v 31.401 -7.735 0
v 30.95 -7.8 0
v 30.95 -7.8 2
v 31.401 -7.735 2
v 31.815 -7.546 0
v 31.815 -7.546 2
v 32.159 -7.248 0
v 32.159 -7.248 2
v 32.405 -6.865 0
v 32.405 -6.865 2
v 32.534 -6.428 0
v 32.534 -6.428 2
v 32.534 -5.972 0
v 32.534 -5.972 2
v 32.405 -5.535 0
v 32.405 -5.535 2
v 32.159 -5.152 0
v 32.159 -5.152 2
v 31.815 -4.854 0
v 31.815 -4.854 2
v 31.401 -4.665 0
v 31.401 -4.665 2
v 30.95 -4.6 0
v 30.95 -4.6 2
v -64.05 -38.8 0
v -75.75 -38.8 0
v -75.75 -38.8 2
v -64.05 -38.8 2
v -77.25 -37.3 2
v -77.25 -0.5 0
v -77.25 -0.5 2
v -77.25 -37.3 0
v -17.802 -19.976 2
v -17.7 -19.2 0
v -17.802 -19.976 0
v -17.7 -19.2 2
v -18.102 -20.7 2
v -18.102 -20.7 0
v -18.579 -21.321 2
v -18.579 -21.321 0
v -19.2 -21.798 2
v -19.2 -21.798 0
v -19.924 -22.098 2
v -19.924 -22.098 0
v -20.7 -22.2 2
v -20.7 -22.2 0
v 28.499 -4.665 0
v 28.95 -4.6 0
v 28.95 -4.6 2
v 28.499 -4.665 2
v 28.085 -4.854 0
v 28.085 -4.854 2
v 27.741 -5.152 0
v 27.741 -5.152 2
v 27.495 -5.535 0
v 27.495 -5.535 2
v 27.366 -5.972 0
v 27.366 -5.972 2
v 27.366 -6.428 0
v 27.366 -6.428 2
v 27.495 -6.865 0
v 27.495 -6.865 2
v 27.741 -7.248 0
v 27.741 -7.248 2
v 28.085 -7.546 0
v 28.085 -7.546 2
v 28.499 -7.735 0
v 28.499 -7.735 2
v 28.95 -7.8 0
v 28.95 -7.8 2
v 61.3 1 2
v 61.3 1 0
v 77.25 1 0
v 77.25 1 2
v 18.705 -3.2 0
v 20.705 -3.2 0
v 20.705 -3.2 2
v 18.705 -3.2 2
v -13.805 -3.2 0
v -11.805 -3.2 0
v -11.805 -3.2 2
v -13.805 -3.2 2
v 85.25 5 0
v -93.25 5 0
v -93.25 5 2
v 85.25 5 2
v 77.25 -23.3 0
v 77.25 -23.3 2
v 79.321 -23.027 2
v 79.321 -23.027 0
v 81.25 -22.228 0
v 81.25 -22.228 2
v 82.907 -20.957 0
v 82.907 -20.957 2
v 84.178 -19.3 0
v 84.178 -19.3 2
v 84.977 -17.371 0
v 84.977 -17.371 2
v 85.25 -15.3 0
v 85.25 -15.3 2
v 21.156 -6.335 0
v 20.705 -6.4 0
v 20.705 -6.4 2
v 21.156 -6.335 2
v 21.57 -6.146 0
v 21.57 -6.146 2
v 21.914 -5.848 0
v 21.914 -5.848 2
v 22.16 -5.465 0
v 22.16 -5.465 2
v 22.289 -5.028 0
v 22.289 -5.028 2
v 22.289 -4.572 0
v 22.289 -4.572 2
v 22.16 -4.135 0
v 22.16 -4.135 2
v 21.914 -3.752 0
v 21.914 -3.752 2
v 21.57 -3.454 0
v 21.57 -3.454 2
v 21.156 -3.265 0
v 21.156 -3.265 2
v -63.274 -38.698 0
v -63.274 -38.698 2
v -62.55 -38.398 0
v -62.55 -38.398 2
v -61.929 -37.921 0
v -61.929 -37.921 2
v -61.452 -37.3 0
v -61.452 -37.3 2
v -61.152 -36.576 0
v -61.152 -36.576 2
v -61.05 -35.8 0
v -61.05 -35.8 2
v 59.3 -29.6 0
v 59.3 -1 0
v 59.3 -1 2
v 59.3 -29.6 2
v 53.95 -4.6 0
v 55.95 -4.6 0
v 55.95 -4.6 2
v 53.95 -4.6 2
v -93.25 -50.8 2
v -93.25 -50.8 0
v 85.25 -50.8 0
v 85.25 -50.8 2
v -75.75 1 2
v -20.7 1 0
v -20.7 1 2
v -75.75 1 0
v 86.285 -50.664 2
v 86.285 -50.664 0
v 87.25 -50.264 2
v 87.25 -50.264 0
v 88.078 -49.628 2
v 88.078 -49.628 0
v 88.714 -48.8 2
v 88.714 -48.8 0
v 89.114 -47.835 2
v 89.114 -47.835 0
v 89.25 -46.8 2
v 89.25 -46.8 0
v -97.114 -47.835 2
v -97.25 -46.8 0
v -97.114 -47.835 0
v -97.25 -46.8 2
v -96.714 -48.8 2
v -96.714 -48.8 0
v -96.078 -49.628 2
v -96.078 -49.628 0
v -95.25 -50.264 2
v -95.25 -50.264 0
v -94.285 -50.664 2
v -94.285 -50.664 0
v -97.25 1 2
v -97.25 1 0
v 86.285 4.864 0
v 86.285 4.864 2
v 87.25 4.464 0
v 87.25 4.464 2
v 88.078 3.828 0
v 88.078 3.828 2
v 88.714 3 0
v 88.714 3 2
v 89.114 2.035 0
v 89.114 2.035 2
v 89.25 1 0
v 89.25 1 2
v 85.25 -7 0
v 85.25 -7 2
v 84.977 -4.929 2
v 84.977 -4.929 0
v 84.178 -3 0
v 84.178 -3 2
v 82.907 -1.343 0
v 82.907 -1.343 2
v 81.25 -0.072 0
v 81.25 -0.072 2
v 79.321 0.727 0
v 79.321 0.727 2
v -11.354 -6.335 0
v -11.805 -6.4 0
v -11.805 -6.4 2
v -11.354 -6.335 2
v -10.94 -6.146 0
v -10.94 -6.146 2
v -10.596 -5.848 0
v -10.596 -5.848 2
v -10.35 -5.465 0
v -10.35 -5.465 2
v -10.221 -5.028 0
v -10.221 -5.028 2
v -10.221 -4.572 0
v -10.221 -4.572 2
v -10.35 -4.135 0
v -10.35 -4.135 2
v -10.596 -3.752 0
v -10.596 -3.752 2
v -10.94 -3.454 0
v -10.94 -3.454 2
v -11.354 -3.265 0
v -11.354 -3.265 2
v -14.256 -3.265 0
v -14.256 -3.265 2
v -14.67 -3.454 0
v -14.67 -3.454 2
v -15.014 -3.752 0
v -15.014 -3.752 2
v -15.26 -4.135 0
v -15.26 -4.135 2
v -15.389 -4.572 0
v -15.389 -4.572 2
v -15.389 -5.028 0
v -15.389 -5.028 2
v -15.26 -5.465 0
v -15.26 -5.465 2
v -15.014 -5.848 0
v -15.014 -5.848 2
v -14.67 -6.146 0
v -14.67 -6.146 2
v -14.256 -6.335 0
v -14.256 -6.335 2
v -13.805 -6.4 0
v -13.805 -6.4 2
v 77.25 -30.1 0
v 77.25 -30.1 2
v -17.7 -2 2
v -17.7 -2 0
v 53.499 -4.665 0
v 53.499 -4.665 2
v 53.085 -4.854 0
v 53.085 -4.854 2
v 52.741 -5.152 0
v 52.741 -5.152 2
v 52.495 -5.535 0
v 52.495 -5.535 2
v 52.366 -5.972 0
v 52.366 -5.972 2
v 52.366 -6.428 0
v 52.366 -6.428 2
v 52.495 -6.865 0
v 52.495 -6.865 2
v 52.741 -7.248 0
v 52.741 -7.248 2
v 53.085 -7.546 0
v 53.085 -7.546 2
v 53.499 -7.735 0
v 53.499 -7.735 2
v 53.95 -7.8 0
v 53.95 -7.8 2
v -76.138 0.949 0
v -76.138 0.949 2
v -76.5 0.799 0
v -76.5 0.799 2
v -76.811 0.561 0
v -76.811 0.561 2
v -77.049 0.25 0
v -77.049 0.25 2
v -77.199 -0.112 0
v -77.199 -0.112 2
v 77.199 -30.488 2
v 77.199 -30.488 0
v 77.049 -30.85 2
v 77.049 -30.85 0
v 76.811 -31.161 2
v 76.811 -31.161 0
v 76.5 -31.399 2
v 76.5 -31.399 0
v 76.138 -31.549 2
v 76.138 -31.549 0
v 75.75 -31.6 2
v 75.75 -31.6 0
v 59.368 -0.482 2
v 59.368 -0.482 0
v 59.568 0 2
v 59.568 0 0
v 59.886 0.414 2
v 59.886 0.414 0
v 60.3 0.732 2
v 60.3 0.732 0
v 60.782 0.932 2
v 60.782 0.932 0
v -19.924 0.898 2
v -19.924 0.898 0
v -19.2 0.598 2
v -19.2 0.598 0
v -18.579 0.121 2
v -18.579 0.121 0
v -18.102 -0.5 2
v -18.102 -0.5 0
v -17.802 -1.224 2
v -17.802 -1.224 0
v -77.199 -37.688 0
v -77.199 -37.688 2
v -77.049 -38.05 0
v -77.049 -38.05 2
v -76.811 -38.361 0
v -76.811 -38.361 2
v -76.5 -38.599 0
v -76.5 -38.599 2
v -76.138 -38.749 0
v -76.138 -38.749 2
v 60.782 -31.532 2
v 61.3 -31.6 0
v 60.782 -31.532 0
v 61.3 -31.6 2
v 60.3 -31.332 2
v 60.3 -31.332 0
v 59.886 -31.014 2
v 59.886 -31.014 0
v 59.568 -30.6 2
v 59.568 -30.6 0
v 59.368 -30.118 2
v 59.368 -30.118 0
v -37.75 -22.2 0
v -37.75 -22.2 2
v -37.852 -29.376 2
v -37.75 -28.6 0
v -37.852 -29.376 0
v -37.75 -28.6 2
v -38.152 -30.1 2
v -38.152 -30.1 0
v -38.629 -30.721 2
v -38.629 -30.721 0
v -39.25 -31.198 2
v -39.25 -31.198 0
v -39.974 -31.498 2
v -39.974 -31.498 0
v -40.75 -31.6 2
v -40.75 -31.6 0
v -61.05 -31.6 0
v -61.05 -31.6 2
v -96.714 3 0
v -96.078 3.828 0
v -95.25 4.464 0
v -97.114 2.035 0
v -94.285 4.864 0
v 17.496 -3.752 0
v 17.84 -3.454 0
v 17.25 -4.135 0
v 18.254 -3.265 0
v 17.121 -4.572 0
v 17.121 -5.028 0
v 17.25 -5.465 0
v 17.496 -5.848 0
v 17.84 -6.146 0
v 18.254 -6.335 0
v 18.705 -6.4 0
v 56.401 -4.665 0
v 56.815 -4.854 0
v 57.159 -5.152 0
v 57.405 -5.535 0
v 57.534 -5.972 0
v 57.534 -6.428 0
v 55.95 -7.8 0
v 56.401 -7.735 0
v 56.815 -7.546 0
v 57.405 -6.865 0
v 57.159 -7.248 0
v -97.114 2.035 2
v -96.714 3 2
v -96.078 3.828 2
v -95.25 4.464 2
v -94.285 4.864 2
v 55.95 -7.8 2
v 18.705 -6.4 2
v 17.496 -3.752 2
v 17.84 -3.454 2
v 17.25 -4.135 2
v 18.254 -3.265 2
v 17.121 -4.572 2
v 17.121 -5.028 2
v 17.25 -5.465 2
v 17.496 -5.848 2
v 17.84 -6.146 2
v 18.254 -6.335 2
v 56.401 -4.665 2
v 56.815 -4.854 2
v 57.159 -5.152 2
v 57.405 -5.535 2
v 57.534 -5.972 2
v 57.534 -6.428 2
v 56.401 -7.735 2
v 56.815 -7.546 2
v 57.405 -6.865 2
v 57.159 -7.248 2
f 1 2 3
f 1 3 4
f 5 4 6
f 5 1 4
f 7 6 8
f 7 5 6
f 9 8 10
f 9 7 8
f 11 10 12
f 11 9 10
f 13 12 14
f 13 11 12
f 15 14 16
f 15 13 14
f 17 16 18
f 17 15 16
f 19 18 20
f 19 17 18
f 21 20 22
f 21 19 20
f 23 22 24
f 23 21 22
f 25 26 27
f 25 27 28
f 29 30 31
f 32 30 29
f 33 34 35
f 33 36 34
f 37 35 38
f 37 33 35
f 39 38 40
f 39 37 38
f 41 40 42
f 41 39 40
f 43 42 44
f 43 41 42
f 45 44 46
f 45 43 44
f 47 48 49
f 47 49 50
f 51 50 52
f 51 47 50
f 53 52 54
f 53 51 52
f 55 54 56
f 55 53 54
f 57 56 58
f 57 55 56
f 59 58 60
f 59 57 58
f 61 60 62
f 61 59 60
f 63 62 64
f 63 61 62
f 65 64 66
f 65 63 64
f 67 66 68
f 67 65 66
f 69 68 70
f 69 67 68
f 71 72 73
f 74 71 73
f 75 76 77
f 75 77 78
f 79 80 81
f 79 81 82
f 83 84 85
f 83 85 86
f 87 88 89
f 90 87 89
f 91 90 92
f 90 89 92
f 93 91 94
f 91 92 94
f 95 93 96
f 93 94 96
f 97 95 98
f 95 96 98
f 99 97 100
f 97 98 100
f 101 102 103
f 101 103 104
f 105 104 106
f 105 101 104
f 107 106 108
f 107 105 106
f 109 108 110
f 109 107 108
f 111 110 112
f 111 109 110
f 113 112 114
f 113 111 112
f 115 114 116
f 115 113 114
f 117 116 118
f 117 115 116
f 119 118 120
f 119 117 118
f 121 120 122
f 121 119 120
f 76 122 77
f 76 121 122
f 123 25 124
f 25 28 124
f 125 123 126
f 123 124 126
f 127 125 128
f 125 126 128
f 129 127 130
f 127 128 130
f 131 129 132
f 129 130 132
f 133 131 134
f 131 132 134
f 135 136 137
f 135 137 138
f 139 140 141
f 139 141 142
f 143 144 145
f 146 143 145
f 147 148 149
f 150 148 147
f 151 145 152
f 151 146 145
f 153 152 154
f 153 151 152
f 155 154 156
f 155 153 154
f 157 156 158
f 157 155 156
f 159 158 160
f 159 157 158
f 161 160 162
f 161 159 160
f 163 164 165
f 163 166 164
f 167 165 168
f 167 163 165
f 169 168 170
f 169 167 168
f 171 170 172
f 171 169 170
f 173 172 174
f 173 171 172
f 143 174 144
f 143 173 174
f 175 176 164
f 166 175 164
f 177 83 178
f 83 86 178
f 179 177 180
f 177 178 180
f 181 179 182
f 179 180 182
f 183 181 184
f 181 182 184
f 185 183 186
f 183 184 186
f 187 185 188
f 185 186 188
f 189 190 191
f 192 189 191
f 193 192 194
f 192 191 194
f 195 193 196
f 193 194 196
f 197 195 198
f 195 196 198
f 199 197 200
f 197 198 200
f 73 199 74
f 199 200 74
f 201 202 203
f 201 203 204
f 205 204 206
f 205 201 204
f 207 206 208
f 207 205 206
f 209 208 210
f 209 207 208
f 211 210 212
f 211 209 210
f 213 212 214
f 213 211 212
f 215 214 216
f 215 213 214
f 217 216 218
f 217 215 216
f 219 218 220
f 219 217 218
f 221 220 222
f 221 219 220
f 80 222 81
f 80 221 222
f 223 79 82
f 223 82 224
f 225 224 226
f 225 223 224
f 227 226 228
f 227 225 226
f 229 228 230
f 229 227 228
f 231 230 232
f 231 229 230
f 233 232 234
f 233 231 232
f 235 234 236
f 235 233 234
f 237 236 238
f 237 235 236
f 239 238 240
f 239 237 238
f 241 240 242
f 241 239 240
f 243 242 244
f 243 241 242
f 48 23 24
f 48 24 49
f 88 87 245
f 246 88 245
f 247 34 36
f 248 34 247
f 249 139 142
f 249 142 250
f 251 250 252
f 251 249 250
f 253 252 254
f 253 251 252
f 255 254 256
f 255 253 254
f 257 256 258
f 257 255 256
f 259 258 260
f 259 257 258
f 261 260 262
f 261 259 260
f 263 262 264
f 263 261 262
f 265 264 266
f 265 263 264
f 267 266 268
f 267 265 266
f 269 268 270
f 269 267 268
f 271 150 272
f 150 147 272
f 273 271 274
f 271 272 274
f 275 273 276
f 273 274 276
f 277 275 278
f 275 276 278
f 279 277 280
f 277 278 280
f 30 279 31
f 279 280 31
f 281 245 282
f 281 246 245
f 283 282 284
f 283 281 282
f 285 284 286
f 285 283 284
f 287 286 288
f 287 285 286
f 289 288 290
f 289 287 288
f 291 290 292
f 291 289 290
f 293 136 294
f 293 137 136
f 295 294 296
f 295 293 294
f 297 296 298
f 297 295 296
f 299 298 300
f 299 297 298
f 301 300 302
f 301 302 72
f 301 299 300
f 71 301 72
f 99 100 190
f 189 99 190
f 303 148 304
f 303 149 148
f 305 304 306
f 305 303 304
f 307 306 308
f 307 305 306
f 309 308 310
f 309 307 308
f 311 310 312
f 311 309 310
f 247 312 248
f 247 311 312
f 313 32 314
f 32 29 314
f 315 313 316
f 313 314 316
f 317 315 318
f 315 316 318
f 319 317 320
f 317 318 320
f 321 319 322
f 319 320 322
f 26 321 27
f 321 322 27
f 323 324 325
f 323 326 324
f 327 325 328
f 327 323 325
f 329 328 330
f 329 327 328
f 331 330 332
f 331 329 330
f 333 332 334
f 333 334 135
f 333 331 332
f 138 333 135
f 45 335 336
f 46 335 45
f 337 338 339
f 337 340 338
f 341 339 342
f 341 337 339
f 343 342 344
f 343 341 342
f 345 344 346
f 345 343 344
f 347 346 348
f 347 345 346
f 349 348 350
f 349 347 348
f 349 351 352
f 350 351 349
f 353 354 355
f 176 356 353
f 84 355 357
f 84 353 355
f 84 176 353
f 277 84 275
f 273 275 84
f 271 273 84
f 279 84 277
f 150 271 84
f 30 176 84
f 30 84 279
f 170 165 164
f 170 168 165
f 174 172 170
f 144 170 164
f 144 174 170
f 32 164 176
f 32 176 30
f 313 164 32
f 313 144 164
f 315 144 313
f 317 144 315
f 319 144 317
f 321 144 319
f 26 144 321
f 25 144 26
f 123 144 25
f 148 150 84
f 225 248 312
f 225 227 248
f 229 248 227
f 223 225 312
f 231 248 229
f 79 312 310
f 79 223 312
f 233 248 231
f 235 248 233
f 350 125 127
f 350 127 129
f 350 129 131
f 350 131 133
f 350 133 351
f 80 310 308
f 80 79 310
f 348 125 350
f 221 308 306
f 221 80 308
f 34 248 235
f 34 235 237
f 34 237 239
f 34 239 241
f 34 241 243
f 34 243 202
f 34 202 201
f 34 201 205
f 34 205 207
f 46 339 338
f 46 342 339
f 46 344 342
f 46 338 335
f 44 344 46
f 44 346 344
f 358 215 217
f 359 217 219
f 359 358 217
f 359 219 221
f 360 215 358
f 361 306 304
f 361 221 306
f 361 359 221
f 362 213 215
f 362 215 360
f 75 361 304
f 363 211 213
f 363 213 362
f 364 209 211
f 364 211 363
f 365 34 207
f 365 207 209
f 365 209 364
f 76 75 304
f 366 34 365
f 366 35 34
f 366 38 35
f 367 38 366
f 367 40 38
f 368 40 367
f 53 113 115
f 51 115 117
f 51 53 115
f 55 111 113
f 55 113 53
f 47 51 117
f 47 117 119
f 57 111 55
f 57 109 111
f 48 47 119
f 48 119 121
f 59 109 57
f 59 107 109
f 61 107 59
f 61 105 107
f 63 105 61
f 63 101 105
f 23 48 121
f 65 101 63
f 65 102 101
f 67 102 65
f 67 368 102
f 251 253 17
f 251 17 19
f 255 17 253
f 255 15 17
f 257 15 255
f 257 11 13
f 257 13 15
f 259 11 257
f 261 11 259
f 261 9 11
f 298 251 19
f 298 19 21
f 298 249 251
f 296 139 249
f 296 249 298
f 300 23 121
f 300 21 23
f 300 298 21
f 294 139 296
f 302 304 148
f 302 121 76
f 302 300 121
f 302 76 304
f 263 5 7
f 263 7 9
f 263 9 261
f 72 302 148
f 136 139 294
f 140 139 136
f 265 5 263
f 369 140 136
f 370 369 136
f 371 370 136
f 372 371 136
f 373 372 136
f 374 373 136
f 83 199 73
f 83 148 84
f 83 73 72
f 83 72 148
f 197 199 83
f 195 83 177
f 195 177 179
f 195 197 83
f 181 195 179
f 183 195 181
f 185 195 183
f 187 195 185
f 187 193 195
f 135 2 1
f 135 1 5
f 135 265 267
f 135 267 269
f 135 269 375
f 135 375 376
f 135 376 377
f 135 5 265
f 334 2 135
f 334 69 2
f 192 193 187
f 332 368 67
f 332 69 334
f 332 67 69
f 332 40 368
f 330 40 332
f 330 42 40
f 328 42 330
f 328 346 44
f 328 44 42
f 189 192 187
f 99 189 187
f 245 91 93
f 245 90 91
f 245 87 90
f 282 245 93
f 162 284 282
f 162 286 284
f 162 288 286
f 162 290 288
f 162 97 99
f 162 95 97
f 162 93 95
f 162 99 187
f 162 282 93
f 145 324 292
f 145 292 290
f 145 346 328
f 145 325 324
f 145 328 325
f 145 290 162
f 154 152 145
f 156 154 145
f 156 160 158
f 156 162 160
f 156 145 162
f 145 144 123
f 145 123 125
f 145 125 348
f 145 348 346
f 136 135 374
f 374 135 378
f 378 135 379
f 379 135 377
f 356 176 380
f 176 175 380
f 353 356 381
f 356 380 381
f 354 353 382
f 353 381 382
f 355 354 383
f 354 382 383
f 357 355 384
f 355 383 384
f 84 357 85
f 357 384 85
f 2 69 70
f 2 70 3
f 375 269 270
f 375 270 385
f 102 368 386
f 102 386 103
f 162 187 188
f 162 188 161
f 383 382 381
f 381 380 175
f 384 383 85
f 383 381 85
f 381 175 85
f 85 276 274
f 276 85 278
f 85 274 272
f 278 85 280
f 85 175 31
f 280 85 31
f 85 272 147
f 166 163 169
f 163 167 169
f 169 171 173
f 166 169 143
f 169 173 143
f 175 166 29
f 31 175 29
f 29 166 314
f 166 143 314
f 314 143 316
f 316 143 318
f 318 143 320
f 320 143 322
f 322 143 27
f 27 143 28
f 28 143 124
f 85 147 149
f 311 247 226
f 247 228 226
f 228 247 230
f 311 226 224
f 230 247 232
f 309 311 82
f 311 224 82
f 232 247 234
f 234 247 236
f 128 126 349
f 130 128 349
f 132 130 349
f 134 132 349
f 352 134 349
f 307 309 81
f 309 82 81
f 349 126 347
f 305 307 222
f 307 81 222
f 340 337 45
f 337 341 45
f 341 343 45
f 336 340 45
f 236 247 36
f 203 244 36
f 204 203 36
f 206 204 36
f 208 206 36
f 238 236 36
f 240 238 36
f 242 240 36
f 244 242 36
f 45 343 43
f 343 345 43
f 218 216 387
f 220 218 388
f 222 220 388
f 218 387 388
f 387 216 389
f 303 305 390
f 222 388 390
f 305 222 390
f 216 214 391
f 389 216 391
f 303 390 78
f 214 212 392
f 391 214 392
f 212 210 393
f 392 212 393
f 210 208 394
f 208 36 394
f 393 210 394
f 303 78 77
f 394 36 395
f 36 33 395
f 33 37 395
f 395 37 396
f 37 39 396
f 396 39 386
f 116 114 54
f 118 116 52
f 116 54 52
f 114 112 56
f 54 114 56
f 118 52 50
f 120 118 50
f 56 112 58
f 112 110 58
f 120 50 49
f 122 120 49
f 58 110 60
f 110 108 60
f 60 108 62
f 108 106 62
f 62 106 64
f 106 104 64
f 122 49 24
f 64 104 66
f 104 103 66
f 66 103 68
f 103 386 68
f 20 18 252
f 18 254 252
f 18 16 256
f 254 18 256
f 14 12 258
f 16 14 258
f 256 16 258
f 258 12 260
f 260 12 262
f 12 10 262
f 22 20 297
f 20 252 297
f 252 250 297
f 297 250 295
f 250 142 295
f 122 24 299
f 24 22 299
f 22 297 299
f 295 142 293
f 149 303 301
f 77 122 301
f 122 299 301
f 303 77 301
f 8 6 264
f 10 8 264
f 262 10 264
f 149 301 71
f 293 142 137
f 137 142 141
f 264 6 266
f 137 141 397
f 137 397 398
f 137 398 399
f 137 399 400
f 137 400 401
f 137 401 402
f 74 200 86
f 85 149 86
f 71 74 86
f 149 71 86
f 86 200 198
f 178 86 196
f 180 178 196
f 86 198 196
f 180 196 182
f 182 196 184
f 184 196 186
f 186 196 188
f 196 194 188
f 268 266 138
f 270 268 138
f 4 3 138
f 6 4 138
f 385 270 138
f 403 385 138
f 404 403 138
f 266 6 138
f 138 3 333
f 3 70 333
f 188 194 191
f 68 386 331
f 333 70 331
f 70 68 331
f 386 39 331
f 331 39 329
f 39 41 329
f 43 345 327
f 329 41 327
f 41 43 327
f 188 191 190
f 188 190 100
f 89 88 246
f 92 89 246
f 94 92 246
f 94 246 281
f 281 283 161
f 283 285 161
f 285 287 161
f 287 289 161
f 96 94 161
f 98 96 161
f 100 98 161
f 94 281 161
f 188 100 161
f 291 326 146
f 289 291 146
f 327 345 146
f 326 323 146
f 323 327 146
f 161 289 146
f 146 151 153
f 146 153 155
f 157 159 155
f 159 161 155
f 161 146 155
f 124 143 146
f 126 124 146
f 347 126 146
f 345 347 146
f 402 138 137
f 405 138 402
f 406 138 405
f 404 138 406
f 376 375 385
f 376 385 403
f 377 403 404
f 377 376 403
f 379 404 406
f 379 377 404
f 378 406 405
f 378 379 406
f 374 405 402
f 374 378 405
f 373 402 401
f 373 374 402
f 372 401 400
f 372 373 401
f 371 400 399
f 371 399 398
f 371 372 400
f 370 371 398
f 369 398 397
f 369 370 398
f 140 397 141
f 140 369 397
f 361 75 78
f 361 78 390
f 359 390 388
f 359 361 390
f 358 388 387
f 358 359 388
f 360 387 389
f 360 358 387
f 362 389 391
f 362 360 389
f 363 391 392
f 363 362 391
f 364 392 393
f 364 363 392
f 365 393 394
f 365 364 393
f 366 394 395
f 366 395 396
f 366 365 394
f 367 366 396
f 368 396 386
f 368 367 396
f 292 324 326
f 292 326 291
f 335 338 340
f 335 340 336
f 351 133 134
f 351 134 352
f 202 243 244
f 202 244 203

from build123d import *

# Parameters (mm, degrees)
SKETCH3_W           = 186.5
SKETCH3_H           = 55.8
SKETCH3_W_2         = 17.95
SKETCH3_H_2         = 32.6
BOSS_EXTRUDE1_DEPTH = 2
CUT_EXTRUDE2_DEPTH  = 110.736969614
CUT_EXTRUDE3_DEPTH  = 110.736969614
FILLET4_R           = 4
FILLET5_R           = 3
FILLET6_R           = 1.5
FILLET7_R           = 2


with BuildPart() as part:
    # Sketch3 → Boss-Extrude1 (new body)
    with BuildSketch(Plane.XY):
        with Locations((-4, 22.9)):
            Rectangle(SKETCH3_W, SKETCH3_H)
        Polygon((-77.25, -1), (-77.25, 38.8), (-61.05, 38.8), (-61.05, 31.6), (-37.75, 31.6), (-37.75, 22.2), (-17.7, 22.2), (-17.7, -1), align=None, mode=Mode.SUBTRACT)
        with Locations((68.275, 15.3)):
            Rectangle(SKETCH3_W_2, SKETCH3_H_2, mode=Mode.SUBTRACT)
    extrude(amount=BOSS_EXTRUDE1_DEPTH)

    # Sketch4 → Cut-Extrude2 (cut, through all)
    with BuildSketch(Plane.XY):
        with BuildLine():
            Line((-13.805, 6.4), (-11.805, 6.4))
            ThreePointArc((-11.805, 6.4), (-10.205, 4.8), (-11.805, 3.2))
            Line((-11.805, 3.2), (-13.805, 3.2))
            ThreePointArc((-13.805, 3.2), (-15.405, 4.8), (-13.805, 6.4))
        make_face()
        with BuildLine():
            Line((18.705, 6.4), (20.705, 6.4))
            ThreePointArc((20.705, 6.4), (22.305, 4.8), (20.705, 3.2))
            Line((20.705, 3.2), (18.705, 3.2))
            ThreePointArc((18.705, 3.2), (17.105, 4.8), (18.705, 6.4))
        make_face()
        with BuildLine():
            Line((28.95, 7.8), (30.95, 7.8))
            ThreePointArc((30.95, 7.8), (32.55, 6.2), (30.95, 4.6))
            Line((30.95, 4.6), (28.95, 4.6))
            ThreePointArc((28.95, 4.6), (27.35, 6.2), (28.95, 7.8))
        make_face()
        with BuildLine():
            Line((53.95, 7.8), (55.95, 7.8))
            ThreePointArc((55.95, 7.8), (57.55, 6.2), (55.95, 4.6))
            Line((55.95, 4.6), (53.95, 4.6))
            ThreePointArc((53.95, 4.6), (52.35, 6.2), (53.95, 7.8))
        make_face()
    extrude(amount=CUT_EXTRUDE2_DEPTH, mode=Mode.SUBTRACT)

    # Sketch5 → Cut-Extrude3 (cut, through all)
    with BuildSketch(Plane.XY.offset(2)):
        with BuildLine():
            Line((85.25, 15.3), (85.25, 7))
            ThreePointArc((85.25, 7), (77.25, -1), (69.25, 7))
            Line((69.25, 7), (69.25, 15.3))
            ThreePointArc((69.25, 15.3), (77.25, 23.3), (85.25, 15.3))
        make_face()
    extrude(amount=-CUT_EXTRUDE3_DEPTH, mode=Mode.SUBTRACT)

    # Fillet4
    fillet4_edges = [part.edges().sort_by_distance(p)[0] for p in [
        (-97.25, 50.8, 1),
        (89.25, 50.8, 1),
        (89.25, -5, 1),
        (-97.25, -5, 1),
    ]]
    fillet(fillet4_edges, radius=FILLET4_R)

    # Fillet5
    fillet5_edges = [part.edges().sort_by_distance(p)[0] for p in [
        (-17.7, -1, 1),
        (-17.7, 22.2, 1),
        (-37.75, 31.6, 1),
        (-61.05, 38.8, 1),
    ]]
    fillet(fillet5_edges, radius=FILLET5_R)

    # Fillet6
    fillet6_edges = [part.edges().sort_by_distance(p)[0] for p in [
        (-77.25, -1, 1),
        (-77.25, 38.8, 1),
        (77.25, 31.6, 1),
    ]]
    fillet(fillet6_edges, radius=FILLET6_R)

    # Fillet7
    fillet7_edges = [part.edges().sort_by_distance(p)[0] for p in [
        (59.3, 31.6, 1),
        (59.3, -1, 1),
    ]]
    fillet(fillet7_edges, radius=FILLET7_R)


with BuildPart() as body_2:
    # Mirror1: mirrored copy
    add(part.part.mirror(Plane.ZX))


solid = body_2.part
